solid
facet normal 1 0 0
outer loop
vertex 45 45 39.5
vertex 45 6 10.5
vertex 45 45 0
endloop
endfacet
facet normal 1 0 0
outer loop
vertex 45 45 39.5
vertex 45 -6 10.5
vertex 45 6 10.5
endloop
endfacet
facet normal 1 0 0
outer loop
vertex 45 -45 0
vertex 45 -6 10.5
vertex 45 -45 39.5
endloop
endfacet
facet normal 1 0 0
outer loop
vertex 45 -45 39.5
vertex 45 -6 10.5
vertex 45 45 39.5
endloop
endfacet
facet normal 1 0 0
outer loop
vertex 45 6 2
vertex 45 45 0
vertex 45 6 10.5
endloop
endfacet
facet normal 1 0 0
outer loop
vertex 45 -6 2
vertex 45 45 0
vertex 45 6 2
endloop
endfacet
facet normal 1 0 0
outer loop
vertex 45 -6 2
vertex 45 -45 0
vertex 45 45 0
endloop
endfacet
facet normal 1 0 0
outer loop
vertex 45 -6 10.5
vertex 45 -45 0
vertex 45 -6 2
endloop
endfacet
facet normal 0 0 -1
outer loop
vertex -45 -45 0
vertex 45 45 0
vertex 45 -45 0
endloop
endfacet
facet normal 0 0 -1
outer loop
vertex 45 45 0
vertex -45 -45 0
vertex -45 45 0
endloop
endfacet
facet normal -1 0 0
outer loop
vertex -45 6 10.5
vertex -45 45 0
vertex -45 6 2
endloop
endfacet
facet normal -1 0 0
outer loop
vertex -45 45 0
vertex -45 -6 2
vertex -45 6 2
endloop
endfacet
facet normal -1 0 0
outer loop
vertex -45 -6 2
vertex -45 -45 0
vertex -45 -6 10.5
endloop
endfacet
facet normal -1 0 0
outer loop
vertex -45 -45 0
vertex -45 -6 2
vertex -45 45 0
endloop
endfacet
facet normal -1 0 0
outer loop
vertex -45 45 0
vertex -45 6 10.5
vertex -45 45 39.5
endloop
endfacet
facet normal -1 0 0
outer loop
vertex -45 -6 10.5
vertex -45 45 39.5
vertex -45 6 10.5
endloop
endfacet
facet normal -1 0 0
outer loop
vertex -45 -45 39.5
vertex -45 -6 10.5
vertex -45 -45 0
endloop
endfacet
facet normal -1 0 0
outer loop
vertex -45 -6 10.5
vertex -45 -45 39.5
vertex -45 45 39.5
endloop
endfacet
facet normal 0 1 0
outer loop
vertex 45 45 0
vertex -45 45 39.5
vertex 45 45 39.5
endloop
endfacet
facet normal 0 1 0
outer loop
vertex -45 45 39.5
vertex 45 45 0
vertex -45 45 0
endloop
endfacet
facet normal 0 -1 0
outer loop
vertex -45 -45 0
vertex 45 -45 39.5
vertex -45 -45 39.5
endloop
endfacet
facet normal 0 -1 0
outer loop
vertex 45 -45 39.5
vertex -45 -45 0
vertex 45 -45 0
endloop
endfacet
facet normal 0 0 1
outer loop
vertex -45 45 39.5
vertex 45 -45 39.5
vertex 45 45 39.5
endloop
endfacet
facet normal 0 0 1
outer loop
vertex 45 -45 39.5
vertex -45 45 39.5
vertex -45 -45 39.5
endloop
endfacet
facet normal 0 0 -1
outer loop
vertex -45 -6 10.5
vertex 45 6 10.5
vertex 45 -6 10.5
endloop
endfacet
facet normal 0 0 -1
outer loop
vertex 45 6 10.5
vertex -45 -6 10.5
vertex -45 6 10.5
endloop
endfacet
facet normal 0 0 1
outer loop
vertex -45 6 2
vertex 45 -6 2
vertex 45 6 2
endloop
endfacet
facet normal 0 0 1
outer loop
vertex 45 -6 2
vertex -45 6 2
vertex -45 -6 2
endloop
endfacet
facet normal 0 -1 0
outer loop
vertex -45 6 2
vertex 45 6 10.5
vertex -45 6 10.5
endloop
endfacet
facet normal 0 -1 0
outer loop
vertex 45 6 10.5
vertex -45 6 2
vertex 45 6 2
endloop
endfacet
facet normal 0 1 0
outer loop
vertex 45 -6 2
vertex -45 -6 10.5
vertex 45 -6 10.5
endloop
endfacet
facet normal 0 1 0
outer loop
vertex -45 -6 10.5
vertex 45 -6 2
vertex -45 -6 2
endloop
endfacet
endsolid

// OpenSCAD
// Magnetic stirrer housing for an 80 mm PC case fan
// Print orientation: top plate on bed (z = 0), walls rise to z = 40, open top.

// ---------- Parameters ----------
top_thickness      = 2;     // top plate thickness
wall_thickness     = 2.5;   // wall thickness
box_height         = 40;    // total height (top plate + walls)
outer_size         = 90;    // outer X and Y size of box
hole_count         = 4;     // number of screw holes in top plate
hole_size          = 4.5;   // screw hole diameter (M4)
hole_pitch         = 71.5;  // square pattern pitch between hole centres
notch_width        = 12;    // cable notch width
notch_depth        = 8;     // notch depth from open edge (z = 32 to z = 40)
eps                = 0.5;   // cutter overshoot past faces
$fn                = 96;    // curve resolution

// ---------- Derived ----------
inner_size = outer_size - 2 * wall_thickness;   // 85 x 85
floor_z    = top_thickness;                     // z = 2 (floor of walls)
ceiling_z  = box_height;                        // z = 40 (open top)

// ---------- Model ----------
difference() {
    // Solid box: top plate + walls, open at top
    translate([-outer_size/2, -outer_size/2, 0])
        cube([outer_size, outer_size, box_height]);

    // Open top: remove everything above ceiling_z - eps
    translate([-outer_size/2, -outer_size/2, ceiling_z - eps])
        cube([outer_size, outer_size, eps + 0.01]);

    // Screw holes in top plate, centred square pattern
    for (i = [0 : hole_count - 1]) {
        a = i < hole_count / 2 ? hole_pitch : -hole_pitch;
        b = i % 2 == 0 ? hole_pitch : -hole_pitch;
        translate([a - hole_size/2, b - hole_size/2, -eps])
            cylinder(d = hole_size, h = top_thickness + 2*eps);
    }

    // Cable notch in one wall, centred along the wall
    translate([-outer_size/2, -notch_width/2, floor_z])
        cube([outer_size, notch_width, notch_depth + eps]);
}
